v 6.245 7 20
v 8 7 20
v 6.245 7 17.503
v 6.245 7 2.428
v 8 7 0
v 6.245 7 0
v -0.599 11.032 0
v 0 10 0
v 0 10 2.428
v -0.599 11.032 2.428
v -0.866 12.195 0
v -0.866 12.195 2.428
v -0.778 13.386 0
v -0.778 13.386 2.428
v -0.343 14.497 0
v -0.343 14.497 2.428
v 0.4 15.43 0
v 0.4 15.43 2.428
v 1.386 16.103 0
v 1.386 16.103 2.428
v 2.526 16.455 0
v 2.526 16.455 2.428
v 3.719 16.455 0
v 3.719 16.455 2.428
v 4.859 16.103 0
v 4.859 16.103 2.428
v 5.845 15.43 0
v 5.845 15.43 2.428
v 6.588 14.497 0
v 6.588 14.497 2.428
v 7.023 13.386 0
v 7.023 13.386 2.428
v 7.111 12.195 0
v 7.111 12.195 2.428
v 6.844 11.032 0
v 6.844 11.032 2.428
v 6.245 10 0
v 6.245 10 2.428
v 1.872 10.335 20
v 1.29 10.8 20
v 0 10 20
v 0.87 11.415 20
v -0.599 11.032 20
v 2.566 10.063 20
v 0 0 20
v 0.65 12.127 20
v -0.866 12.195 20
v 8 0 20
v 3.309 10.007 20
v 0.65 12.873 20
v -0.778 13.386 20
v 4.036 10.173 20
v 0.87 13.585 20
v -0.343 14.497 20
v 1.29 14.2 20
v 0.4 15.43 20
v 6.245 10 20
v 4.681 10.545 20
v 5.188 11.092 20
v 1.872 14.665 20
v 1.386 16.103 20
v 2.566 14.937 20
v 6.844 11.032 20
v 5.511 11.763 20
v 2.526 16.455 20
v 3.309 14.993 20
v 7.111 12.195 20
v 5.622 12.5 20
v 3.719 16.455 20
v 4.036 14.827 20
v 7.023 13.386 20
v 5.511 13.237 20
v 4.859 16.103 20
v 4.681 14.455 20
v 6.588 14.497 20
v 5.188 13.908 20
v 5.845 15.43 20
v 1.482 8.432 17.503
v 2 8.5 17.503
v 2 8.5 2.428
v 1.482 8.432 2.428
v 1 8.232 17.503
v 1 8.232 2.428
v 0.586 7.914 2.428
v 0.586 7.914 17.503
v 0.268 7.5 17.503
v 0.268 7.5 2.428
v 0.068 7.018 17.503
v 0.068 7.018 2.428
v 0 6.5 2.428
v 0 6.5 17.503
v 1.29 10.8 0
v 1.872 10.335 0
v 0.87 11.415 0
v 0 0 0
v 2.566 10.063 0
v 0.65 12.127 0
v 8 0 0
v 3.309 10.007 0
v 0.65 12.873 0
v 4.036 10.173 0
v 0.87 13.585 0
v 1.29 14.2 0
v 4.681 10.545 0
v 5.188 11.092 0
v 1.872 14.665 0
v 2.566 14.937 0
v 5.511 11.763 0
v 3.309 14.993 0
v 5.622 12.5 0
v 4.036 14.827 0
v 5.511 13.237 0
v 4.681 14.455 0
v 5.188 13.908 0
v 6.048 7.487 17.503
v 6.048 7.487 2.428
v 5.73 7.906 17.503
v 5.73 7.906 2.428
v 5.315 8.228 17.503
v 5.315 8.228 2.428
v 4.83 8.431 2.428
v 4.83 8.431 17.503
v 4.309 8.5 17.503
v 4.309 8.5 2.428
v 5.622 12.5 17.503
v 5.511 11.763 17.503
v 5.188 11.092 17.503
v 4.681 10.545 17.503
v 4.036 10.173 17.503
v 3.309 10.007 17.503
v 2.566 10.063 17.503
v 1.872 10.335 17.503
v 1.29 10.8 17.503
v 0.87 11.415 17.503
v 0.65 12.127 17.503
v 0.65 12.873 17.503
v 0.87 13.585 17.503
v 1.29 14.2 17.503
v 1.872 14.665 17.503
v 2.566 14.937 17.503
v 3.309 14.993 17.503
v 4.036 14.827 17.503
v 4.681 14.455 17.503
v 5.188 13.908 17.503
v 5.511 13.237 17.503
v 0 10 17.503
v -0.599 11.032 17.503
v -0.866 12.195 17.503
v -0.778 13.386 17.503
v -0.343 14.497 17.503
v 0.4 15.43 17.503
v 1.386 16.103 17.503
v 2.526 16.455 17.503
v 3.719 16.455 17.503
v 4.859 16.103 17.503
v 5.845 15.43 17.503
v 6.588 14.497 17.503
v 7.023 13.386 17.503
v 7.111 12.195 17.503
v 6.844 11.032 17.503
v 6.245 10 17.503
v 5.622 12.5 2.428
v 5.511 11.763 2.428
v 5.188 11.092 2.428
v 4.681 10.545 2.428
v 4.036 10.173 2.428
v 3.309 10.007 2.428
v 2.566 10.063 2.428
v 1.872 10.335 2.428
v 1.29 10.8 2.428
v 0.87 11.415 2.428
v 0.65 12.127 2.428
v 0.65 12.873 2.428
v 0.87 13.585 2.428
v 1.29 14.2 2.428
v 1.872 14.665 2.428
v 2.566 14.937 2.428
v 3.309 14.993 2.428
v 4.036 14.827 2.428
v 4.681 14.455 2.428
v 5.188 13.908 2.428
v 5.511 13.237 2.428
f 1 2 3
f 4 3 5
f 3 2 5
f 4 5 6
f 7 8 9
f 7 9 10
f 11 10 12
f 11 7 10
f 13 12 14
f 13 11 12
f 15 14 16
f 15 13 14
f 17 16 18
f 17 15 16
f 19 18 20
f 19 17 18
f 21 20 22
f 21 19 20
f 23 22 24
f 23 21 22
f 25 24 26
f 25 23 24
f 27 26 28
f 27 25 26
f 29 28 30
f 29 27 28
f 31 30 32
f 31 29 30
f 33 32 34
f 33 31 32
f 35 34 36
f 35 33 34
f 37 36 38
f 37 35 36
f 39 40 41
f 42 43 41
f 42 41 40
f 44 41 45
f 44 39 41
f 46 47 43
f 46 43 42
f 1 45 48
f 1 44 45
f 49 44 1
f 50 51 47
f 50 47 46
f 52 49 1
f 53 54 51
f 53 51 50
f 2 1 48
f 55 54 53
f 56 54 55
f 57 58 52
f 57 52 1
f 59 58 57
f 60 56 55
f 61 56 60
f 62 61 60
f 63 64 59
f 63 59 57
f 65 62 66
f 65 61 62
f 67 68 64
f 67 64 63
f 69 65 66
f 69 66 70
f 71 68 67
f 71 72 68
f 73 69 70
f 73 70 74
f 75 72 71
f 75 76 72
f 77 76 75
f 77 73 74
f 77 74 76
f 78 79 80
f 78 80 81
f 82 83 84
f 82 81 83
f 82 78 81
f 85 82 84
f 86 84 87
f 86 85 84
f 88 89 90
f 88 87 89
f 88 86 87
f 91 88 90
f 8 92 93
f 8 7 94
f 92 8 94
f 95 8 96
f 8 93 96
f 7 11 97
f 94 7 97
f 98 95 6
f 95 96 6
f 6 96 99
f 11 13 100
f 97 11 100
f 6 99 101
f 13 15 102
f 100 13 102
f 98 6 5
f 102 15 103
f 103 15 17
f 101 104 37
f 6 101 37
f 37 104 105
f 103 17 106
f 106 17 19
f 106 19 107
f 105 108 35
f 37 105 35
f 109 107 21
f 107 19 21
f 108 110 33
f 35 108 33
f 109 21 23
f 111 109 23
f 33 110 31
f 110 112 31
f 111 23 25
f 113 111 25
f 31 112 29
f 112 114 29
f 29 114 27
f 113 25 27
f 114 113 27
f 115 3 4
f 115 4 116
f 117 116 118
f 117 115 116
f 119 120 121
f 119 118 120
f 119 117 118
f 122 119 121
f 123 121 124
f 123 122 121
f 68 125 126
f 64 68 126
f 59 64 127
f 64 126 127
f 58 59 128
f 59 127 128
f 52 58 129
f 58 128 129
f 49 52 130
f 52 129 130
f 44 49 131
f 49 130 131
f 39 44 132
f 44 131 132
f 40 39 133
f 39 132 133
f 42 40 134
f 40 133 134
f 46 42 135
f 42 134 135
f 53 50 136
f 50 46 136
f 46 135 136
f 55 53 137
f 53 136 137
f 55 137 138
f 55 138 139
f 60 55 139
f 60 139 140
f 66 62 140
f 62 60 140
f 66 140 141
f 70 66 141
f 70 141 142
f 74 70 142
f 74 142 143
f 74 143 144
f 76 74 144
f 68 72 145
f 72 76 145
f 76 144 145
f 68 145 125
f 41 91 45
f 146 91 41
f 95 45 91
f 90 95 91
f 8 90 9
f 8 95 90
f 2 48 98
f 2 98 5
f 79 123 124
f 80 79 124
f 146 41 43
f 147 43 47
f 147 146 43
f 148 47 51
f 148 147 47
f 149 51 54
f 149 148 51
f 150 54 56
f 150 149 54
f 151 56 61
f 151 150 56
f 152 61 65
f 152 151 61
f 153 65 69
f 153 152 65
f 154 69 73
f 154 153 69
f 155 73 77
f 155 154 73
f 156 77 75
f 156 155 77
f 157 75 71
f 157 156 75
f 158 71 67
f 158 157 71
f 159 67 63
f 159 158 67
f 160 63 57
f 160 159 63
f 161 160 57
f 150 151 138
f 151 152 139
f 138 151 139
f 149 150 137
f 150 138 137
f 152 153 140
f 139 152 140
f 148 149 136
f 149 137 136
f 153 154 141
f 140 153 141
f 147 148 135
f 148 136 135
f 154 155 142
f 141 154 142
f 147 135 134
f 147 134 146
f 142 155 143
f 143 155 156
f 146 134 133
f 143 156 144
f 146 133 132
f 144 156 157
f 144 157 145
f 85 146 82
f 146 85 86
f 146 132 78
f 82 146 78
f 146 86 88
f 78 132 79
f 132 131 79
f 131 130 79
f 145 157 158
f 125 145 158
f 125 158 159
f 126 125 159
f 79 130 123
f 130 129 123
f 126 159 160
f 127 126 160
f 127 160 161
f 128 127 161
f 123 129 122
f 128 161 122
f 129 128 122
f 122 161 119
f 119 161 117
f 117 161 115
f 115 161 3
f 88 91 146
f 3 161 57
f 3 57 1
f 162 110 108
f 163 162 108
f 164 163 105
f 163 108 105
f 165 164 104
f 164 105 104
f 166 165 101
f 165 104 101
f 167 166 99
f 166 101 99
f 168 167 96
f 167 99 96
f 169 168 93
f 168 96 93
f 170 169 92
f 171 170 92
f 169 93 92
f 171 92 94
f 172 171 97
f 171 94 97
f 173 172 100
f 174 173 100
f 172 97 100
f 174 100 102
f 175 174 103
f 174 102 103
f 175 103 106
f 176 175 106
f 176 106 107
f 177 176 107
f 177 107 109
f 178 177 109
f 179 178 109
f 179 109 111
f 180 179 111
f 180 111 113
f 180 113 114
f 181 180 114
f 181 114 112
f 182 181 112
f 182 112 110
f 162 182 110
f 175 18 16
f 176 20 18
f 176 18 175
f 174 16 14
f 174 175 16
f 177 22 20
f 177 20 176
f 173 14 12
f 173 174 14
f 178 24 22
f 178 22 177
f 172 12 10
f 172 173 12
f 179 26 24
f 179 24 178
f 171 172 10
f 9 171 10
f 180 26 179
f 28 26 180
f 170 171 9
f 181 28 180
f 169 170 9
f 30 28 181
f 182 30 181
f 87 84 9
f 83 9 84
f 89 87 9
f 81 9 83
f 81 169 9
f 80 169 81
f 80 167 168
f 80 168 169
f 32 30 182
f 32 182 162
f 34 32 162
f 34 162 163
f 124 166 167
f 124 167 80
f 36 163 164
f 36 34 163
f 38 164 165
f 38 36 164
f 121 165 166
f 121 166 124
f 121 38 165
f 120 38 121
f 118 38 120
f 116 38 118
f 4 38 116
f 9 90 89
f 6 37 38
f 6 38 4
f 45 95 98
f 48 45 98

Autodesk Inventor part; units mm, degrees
ref_plane "YZ Plane" through (0, 0, 0) normal (1, 0, 0) x (0, 1, 0)
ref_plane "XZ Plane" through (0, 0, 0) normal (0, 1, 0) x (-1, 0, 0)
ref_plane "XY Plane" through (0, 0, 0) normal (0, 0, 1) x (1, 0, 0)
sketch "Sketch1" plane through (0, 0, 0) normal (0, 0, 1) x (1, 0, 0)
  line L0 (0, 0) -> (0, 10)
  line L1 (6.245, 10) -> (6.245, 7)
  circle A0 centre (3.1225, 12.5) radius 2.5
  arc A1 (6.245, 10) -> (0, 10) centre (3.1225, 12.5) ccw
  line L2 (6, 10) -> (0, 10) construction
  line L3 (8, 0) -> (8, 7)
  line L4 (8, 7) -> (6.245, 7)
  line L5 (0, 0) -> (8, 0)
  dimension "d2" = 8
  dimension "d3" = 5
  dimension "d5" = 10
  dimension "d17" = 7
  dimension "d18" = 3
  dimension "d19" = 8
extrude "Extrusion1" add sketch "Sketch1" along normal blind 20
sketch "Sketch2" plane through (0, 0, 0) normal (-1, 0, 0) x (0, 0, 1)
  point P0 (0, 0)
sketch "Sketch3" plane through (6.245, 0, 0) normal (1, 0, 0) x (0, 0, -1)
  line L0 (0, 10) -> (-20, 10) projected
  line L1 (-17.5032, 10) -> (-17.5032, 16.6156)
  line L2 (-17.5032, 16.6156) -> (-2.428, 16.6156)
  line L3 (0, 16.5) -> (-20, 16.5) projected
  line L4 (-2.428, 16.6156) -> (-2.428, 10)
  line L5 (-2.428, 10) -> (-17.5032, 10)
  point P0 (0, 0)
extrude "Extrusion2" cut sketch "Sketch3" along normal mid plane 20
sketch "Sketch4" plane through (6.245, 0, 0) normal (1, 0, 0) x (0, 0, -1)
  line L0 (0, 0) -> (-20, 0) projected
  line L1 (0, 0) -> (0, 10) projected
  line L2 (-20, 0) -> (0, 0)
  line L3 (0, 0) -> (0, 6.4437)
  line L4 (0, 6.4437) -> (-20, 6.4437)
  line L5 (-20, 6.4437) -> (-20, 0)
extrude "Extrusion3" add sketch "Sketch4" along normal blind 0.1
sketch "Sketch5" plane through (6.245, 10, 17.5032) normal (1, 0, 0) x (0, 0, -1)
  line L0 (0, 6.5) -> (0, 0) projected
  line L1 (0, 6.5) -> (0, -1.5)
  line L2 (0, -1.5) -> (15.0752, -1.5)
  line L3 (15.0752, 6.5) -> (15.0752, -1.5)
  line L4 (0, 6.5) -> (15.0752, 6.5)
  point P0 (17.5032, -10)
  dimension "d12" = 8
  dimension "d13" = 15.0752
extrude "Extrusion4" cut sketch "Sketch5" against normal blind 10
fillet "Fillet1" radius 2 1 edges at (6.245, 8.5, 9.9656)
fillet "Fillet2" radius 2 1 edges at (0, 8.5, 9.9656)
sketch "Sketch6" plane through (8, 0, 0) normal (1, 0, 0) x (0, 0, -1)
  line L0 (-2.428, 7) -> (-2.428, 10) projected
  line L1 (-2.428, 10) -> (-17.5032, 10)
  line L2 (-17.5032, 18.1901) -> (-2.428, 18.1901)
  line L3 (0, 10) -> (-2.428, 10) projected
  line L4 (-2.428, 18.1901) -> (-2.428, 10)
  line L5 (-17.5032, 10) -> (-17.5032, 10) projected
  line L6 (-17.5032, 18.1901) -> (-17.5032, 10)
  point P0 (0, 0)
  point P1 (-17.5032, 16.5)
extrude "Extrusion5" cut sketch "Sketch6" against normal blind 10
properties part number "HingeBase1"
